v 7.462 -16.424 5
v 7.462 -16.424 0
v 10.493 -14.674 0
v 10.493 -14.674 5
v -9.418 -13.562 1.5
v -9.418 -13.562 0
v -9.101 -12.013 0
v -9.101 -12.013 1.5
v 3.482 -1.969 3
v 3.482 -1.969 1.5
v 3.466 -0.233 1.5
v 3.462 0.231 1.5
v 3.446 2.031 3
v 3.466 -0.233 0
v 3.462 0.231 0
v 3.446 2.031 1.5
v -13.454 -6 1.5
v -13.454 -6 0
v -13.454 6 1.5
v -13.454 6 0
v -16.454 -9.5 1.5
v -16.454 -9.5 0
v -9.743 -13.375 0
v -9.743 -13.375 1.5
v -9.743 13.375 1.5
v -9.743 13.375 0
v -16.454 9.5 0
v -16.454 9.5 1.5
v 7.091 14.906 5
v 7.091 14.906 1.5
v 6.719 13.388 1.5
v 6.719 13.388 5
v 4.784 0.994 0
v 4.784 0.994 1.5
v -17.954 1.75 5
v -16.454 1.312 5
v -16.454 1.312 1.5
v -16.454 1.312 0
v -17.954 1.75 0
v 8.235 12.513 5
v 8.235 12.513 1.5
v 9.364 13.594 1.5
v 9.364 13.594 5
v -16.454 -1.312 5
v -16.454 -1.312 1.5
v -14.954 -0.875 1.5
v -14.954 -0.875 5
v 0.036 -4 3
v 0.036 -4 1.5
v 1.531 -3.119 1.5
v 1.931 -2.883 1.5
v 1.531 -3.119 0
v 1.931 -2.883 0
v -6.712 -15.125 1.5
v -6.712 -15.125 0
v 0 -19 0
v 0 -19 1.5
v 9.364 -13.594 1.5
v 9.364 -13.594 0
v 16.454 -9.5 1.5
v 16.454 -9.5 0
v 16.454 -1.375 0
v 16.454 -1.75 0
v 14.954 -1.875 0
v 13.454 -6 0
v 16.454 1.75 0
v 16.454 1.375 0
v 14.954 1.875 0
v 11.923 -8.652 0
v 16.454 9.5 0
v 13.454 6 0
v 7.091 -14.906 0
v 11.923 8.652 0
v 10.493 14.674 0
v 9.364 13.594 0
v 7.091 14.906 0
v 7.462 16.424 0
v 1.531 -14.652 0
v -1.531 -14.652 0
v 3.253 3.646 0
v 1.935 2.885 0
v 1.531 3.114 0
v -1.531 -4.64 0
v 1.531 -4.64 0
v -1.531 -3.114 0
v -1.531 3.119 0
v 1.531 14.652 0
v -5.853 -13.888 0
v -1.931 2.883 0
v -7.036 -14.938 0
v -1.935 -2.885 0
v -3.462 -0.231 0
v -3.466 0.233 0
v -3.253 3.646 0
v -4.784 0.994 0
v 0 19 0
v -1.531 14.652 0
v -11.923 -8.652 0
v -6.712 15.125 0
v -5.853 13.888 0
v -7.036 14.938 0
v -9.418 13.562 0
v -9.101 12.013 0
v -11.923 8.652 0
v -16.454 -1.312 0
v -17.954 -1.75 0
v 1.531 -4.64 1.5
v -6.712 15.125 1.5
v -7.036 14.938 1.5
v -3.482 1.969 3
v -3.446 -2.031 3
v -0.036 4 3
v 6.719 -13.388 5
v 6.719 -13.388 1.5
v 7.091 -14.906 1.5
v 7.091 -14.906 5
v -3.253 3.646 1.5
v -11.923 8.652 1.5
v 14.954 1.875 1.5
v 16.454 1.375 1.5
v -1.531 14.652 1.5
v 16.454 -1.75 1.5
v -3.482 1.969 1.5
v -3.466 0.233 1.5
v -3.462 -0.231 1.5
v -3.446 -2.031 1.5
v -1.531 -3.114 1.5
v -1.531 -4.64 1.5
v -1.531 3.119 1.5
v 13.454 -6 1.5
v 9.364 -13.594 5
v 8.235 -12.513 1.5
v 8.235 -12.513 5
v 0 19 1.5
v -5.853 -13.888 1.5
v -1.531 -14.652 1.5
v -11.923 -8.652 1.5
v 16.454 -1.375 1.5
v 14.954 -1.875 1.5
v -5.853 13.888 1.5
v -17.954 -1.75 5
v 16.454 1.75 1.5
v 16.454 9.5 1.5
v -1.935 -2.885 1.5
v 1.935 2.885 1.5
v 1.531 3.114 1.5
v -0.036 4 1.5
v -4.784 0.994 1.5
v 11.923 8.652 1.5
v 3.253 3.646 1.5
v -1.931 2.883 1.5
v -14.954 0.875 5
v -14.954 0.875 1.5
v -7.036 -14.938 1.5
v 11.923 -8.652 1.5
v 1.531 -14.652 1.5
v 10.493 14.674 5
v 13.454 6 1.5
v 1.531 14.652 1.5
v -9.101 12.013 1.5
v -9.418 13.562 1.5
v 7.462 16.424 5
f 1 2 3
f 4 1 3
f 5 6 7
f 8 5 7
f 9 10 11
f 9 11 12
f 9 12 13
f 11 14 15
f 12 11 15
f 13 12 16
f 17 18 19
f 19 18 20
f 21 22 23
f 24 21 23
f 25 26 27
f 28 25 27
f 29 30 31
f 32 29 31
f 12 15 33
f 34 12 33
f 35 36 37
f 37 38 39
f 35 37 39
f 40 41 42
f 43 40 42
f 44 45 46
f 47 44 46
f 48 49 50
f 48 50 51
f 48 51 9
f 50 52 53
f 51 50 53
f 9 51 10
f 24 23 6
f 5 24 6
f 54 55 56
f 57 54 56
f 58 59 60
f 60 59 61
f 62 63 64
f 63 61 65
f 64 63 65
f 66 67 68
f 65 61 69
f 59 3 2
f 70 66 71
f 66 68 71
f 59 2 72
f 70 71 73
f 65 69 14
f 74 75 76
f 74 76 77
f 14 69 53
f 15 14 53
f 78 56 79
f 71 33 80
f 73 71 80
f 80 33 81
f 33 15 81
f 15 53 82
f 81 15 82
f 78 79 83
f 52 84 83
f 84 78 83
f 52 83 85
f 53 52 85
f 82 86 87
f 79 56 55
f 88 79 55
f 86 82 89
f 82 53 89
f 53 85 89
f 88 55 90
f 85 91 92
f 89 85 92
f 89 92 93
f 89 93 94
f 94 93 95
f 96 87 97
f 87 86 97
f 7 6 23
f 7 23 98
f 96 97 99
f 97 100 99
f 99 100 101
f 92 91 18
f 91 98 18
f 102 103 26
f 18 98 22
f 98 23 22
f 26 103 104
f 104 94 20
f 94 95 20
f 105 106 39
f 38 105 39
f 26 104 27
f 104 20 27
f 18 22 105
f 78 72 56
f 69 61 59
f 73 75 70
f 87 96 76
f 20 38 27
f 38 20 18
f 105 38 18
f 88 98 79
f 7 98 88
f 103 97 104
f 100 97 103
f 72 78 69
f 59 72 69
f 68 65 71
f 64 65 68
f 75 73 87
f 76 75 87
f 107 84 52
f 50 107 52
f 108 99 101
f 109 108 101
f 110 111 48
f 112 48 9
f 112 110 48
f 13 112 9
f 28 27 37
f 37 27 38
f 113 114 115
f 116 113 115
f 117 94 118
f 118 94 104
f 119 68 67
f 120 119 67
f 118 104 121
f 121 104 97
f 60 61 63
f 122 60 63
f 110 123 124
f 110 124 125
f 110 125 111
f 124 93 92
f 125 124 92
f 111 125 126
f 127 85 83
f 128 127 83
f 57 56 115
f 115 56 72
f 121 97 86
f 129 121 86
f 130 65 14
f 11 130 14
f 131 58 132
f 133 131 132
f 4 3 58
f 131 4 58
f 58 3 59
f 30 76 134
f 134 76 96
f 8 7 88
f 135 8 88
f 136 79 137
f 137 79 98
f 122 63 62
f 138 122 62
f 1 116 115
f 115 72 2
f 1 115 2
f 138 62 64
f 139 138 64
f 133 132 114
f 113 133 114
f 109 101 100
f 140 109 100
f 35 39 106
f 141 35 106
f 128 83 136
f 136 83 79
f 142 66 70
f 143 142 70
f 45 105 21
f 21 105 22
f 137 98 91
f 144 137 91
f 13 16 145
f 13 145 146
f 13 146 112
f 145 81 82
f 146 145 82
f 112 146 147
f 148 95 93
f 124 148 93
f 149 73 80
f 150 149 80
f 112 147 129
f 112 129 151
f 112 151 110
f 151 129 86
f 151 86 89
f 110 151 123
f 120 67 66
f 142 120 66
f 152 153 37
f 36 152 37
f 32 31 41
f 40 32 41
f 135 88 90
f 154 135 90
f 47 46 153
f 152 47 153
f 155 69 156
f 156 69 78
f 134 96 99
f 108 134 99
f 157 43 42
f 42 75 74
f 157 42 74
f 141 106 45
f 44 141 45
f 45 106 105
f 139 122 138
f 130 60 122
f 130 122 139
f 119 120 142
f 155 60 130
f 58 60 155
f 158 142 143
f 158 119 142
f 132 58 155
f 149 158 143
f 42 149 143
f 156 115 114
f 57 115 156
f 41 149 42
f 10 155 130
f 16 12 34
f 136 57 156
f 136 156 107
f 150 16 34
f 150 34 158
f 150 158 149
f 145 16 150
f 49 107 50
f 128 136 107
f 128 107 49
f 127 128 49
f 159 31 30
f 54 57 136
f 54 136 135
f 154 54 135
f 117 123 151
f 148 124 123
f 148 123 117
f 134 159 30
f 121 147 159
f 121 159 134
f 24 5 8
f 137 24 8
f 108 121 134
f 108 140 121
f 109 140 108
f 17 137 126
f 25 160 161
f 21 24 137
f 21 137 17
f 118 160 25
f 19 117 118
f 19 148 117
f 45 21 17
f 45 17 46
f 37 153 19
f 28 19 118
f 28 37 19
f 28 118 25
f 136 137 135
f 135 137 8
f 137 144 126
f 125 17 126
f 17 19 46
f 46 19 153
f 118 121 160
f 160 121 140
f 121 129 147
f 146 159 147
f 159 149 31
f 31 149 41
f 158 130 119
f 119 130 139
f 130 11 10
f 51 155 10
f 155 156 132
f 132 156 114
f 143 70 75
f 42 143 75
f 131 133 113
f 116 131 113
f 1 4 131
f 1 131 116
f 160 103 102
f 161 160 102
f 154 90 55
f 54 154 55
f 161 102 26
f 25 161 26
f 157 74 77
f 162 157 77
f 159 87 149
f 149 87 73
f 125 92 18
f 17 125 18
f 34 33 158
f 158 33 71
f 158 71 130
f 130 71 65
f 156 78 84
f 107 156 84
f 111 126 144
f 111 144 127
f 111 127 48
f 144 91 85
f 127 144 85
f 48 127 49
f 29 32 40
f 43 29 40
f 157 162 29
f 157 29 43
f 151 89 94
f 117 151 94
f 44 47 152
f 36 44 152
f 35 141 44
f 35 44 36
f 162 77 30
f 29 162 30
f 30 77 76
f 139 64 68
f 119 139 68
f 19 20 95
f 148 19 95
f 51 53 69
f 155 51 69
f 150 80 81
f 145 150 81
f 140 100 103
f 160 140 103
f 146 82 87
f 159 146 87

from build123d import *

# Parameters (mm, degrees)
F1_DEPTH = 1.5
F2_DEPTH = 5
F3_ANGLE = 120
F4_ANGLE = 120
F6_DEPTH = 3


with BuildPart() as f1:
    # F0 (on Top) → F1 (new body)
    with BuildSketch(Plane.XY):
        Polygon((4.7835907286, 2.7618073949), (16.4544826719, 9.5), (9.3638996784, 13.59375), (8.2350135643, 12.5134618943), (6.7194691076, 13.3884618943), (7.0905829935, 14.90625), (0, 19), (0, 5.5236147897), (1.5310889132, 4.6396401935), (1.5310889132, 14.6519237886), (11.9233937587, 8.6519237886), (3.2525018154, 3.6457819911), align=None)
        Polygon((0, 0), (4.7835907286, 2.7618073949), (3.2525018154, 3.6457819911), (1.5310889132, 2.6519237886), (1.5310889132, 4.6396401935), (0, 5.5236147897), align=None)
        Polygon((-4.7835907286, 2.7618073949), (0, 0), (0, 5.5236147897), (-1.5310889132, 4.6396401935), (-1.5310889132, 2.6519237886), (-3.2525018154, 3.6457819911), align=None)
        Polygon((-1.5310889132, 4.6396401935), (0, 5.5236147897), (0, 19), (-6.7116968793, 15.125), (-7.0364564057, 14.9375), (-5.8534437039, 13.8884618943), (-9.101038968, 12.0134618943), (-9.4180262662, 13.5625), (-9.7427857926, 13.375), (-16.4544826719, 9.5), (-4.7835907286, 2.7618073949), (-3.2525018154, 3.6457819911), (-11.9233937587, 8.6519237886), (-1.5310889132, 14.6519237886), align=None)
    extrude(amount=F1_DEPTH)

    # F0 (on Top) → F2 (join)
    with BuildSketch(Plane.XY):
        Polygon((8.2350135643, 12.5134618943), (9.3638996784, 13.59375), (9.0888552775, 13.7525469589), (8.1894266762, 12.8918383296), (7.0699461568, 13.5381707088), (7.3656273944, 14.7474530411), (7.0905829935, 14.90625), (6.7194691076, 13.3884618943), align=None)
        Polygon((8.1894266762, 12.8918383296), (9.0888552775, 13.7525469589), (7.3656273944, 14.7474530411), (7.0699461568, 13.5381707088), align=None)
        Polygon((7.3656273944, 14.7474530411), (9.0888552775, 13.7525469589), (9.9882838789, 14.6132555882), (7.6613086319, 15.9567353735), align=None)
        Polygon((9.0888552775, 13.7525469589), (9.3638996784, 13.59375), (10.4927857926, 14.6740381057), (7.4616968793, 16.4240381057), (7.0905829935, 14.90625), (7.3656273944, 14.7474530411), (7.6613086319, 15.9567353735), (9.9882838789, 14.6132555882), align=None)
    extrude(amount=F2_DEPTH)


with BuildPart() as f3_1:
    # F3: copy of F1
    add(f1.part.rotate(Axis((0, 0, 0.75), (0, 0, -1)), F3_ANGLE))


with BuildPart() as f4_1:
    # F4: copy of F3_1
    add(f3_1.part.rotate(Axis((0, 0, 0.75), (0, 0, -1)), F4_ANGLE))


with BuildPart() as f1_1:
    add(f1.part)

    add(f3_1.part)  # F6 merges F3_1

    add(f4_1.part)  # F6 merges F4_1
    # F5 (on Top) → F6 (join)
    with BuildSketch(Plane.XY):
        Polygon((0.0358819761, -3.9998390572), (3.4819032227, -1.9688448258), (3.4460212466, 2.0309942315), (-0.0358819761, 3.9998390572), (-3.4819032227, 1.9688448258), (-3.4460212466, -2.0309942315), align=None)
    extrude(amount=F6_DEPTH)


solid = f1_1.part
